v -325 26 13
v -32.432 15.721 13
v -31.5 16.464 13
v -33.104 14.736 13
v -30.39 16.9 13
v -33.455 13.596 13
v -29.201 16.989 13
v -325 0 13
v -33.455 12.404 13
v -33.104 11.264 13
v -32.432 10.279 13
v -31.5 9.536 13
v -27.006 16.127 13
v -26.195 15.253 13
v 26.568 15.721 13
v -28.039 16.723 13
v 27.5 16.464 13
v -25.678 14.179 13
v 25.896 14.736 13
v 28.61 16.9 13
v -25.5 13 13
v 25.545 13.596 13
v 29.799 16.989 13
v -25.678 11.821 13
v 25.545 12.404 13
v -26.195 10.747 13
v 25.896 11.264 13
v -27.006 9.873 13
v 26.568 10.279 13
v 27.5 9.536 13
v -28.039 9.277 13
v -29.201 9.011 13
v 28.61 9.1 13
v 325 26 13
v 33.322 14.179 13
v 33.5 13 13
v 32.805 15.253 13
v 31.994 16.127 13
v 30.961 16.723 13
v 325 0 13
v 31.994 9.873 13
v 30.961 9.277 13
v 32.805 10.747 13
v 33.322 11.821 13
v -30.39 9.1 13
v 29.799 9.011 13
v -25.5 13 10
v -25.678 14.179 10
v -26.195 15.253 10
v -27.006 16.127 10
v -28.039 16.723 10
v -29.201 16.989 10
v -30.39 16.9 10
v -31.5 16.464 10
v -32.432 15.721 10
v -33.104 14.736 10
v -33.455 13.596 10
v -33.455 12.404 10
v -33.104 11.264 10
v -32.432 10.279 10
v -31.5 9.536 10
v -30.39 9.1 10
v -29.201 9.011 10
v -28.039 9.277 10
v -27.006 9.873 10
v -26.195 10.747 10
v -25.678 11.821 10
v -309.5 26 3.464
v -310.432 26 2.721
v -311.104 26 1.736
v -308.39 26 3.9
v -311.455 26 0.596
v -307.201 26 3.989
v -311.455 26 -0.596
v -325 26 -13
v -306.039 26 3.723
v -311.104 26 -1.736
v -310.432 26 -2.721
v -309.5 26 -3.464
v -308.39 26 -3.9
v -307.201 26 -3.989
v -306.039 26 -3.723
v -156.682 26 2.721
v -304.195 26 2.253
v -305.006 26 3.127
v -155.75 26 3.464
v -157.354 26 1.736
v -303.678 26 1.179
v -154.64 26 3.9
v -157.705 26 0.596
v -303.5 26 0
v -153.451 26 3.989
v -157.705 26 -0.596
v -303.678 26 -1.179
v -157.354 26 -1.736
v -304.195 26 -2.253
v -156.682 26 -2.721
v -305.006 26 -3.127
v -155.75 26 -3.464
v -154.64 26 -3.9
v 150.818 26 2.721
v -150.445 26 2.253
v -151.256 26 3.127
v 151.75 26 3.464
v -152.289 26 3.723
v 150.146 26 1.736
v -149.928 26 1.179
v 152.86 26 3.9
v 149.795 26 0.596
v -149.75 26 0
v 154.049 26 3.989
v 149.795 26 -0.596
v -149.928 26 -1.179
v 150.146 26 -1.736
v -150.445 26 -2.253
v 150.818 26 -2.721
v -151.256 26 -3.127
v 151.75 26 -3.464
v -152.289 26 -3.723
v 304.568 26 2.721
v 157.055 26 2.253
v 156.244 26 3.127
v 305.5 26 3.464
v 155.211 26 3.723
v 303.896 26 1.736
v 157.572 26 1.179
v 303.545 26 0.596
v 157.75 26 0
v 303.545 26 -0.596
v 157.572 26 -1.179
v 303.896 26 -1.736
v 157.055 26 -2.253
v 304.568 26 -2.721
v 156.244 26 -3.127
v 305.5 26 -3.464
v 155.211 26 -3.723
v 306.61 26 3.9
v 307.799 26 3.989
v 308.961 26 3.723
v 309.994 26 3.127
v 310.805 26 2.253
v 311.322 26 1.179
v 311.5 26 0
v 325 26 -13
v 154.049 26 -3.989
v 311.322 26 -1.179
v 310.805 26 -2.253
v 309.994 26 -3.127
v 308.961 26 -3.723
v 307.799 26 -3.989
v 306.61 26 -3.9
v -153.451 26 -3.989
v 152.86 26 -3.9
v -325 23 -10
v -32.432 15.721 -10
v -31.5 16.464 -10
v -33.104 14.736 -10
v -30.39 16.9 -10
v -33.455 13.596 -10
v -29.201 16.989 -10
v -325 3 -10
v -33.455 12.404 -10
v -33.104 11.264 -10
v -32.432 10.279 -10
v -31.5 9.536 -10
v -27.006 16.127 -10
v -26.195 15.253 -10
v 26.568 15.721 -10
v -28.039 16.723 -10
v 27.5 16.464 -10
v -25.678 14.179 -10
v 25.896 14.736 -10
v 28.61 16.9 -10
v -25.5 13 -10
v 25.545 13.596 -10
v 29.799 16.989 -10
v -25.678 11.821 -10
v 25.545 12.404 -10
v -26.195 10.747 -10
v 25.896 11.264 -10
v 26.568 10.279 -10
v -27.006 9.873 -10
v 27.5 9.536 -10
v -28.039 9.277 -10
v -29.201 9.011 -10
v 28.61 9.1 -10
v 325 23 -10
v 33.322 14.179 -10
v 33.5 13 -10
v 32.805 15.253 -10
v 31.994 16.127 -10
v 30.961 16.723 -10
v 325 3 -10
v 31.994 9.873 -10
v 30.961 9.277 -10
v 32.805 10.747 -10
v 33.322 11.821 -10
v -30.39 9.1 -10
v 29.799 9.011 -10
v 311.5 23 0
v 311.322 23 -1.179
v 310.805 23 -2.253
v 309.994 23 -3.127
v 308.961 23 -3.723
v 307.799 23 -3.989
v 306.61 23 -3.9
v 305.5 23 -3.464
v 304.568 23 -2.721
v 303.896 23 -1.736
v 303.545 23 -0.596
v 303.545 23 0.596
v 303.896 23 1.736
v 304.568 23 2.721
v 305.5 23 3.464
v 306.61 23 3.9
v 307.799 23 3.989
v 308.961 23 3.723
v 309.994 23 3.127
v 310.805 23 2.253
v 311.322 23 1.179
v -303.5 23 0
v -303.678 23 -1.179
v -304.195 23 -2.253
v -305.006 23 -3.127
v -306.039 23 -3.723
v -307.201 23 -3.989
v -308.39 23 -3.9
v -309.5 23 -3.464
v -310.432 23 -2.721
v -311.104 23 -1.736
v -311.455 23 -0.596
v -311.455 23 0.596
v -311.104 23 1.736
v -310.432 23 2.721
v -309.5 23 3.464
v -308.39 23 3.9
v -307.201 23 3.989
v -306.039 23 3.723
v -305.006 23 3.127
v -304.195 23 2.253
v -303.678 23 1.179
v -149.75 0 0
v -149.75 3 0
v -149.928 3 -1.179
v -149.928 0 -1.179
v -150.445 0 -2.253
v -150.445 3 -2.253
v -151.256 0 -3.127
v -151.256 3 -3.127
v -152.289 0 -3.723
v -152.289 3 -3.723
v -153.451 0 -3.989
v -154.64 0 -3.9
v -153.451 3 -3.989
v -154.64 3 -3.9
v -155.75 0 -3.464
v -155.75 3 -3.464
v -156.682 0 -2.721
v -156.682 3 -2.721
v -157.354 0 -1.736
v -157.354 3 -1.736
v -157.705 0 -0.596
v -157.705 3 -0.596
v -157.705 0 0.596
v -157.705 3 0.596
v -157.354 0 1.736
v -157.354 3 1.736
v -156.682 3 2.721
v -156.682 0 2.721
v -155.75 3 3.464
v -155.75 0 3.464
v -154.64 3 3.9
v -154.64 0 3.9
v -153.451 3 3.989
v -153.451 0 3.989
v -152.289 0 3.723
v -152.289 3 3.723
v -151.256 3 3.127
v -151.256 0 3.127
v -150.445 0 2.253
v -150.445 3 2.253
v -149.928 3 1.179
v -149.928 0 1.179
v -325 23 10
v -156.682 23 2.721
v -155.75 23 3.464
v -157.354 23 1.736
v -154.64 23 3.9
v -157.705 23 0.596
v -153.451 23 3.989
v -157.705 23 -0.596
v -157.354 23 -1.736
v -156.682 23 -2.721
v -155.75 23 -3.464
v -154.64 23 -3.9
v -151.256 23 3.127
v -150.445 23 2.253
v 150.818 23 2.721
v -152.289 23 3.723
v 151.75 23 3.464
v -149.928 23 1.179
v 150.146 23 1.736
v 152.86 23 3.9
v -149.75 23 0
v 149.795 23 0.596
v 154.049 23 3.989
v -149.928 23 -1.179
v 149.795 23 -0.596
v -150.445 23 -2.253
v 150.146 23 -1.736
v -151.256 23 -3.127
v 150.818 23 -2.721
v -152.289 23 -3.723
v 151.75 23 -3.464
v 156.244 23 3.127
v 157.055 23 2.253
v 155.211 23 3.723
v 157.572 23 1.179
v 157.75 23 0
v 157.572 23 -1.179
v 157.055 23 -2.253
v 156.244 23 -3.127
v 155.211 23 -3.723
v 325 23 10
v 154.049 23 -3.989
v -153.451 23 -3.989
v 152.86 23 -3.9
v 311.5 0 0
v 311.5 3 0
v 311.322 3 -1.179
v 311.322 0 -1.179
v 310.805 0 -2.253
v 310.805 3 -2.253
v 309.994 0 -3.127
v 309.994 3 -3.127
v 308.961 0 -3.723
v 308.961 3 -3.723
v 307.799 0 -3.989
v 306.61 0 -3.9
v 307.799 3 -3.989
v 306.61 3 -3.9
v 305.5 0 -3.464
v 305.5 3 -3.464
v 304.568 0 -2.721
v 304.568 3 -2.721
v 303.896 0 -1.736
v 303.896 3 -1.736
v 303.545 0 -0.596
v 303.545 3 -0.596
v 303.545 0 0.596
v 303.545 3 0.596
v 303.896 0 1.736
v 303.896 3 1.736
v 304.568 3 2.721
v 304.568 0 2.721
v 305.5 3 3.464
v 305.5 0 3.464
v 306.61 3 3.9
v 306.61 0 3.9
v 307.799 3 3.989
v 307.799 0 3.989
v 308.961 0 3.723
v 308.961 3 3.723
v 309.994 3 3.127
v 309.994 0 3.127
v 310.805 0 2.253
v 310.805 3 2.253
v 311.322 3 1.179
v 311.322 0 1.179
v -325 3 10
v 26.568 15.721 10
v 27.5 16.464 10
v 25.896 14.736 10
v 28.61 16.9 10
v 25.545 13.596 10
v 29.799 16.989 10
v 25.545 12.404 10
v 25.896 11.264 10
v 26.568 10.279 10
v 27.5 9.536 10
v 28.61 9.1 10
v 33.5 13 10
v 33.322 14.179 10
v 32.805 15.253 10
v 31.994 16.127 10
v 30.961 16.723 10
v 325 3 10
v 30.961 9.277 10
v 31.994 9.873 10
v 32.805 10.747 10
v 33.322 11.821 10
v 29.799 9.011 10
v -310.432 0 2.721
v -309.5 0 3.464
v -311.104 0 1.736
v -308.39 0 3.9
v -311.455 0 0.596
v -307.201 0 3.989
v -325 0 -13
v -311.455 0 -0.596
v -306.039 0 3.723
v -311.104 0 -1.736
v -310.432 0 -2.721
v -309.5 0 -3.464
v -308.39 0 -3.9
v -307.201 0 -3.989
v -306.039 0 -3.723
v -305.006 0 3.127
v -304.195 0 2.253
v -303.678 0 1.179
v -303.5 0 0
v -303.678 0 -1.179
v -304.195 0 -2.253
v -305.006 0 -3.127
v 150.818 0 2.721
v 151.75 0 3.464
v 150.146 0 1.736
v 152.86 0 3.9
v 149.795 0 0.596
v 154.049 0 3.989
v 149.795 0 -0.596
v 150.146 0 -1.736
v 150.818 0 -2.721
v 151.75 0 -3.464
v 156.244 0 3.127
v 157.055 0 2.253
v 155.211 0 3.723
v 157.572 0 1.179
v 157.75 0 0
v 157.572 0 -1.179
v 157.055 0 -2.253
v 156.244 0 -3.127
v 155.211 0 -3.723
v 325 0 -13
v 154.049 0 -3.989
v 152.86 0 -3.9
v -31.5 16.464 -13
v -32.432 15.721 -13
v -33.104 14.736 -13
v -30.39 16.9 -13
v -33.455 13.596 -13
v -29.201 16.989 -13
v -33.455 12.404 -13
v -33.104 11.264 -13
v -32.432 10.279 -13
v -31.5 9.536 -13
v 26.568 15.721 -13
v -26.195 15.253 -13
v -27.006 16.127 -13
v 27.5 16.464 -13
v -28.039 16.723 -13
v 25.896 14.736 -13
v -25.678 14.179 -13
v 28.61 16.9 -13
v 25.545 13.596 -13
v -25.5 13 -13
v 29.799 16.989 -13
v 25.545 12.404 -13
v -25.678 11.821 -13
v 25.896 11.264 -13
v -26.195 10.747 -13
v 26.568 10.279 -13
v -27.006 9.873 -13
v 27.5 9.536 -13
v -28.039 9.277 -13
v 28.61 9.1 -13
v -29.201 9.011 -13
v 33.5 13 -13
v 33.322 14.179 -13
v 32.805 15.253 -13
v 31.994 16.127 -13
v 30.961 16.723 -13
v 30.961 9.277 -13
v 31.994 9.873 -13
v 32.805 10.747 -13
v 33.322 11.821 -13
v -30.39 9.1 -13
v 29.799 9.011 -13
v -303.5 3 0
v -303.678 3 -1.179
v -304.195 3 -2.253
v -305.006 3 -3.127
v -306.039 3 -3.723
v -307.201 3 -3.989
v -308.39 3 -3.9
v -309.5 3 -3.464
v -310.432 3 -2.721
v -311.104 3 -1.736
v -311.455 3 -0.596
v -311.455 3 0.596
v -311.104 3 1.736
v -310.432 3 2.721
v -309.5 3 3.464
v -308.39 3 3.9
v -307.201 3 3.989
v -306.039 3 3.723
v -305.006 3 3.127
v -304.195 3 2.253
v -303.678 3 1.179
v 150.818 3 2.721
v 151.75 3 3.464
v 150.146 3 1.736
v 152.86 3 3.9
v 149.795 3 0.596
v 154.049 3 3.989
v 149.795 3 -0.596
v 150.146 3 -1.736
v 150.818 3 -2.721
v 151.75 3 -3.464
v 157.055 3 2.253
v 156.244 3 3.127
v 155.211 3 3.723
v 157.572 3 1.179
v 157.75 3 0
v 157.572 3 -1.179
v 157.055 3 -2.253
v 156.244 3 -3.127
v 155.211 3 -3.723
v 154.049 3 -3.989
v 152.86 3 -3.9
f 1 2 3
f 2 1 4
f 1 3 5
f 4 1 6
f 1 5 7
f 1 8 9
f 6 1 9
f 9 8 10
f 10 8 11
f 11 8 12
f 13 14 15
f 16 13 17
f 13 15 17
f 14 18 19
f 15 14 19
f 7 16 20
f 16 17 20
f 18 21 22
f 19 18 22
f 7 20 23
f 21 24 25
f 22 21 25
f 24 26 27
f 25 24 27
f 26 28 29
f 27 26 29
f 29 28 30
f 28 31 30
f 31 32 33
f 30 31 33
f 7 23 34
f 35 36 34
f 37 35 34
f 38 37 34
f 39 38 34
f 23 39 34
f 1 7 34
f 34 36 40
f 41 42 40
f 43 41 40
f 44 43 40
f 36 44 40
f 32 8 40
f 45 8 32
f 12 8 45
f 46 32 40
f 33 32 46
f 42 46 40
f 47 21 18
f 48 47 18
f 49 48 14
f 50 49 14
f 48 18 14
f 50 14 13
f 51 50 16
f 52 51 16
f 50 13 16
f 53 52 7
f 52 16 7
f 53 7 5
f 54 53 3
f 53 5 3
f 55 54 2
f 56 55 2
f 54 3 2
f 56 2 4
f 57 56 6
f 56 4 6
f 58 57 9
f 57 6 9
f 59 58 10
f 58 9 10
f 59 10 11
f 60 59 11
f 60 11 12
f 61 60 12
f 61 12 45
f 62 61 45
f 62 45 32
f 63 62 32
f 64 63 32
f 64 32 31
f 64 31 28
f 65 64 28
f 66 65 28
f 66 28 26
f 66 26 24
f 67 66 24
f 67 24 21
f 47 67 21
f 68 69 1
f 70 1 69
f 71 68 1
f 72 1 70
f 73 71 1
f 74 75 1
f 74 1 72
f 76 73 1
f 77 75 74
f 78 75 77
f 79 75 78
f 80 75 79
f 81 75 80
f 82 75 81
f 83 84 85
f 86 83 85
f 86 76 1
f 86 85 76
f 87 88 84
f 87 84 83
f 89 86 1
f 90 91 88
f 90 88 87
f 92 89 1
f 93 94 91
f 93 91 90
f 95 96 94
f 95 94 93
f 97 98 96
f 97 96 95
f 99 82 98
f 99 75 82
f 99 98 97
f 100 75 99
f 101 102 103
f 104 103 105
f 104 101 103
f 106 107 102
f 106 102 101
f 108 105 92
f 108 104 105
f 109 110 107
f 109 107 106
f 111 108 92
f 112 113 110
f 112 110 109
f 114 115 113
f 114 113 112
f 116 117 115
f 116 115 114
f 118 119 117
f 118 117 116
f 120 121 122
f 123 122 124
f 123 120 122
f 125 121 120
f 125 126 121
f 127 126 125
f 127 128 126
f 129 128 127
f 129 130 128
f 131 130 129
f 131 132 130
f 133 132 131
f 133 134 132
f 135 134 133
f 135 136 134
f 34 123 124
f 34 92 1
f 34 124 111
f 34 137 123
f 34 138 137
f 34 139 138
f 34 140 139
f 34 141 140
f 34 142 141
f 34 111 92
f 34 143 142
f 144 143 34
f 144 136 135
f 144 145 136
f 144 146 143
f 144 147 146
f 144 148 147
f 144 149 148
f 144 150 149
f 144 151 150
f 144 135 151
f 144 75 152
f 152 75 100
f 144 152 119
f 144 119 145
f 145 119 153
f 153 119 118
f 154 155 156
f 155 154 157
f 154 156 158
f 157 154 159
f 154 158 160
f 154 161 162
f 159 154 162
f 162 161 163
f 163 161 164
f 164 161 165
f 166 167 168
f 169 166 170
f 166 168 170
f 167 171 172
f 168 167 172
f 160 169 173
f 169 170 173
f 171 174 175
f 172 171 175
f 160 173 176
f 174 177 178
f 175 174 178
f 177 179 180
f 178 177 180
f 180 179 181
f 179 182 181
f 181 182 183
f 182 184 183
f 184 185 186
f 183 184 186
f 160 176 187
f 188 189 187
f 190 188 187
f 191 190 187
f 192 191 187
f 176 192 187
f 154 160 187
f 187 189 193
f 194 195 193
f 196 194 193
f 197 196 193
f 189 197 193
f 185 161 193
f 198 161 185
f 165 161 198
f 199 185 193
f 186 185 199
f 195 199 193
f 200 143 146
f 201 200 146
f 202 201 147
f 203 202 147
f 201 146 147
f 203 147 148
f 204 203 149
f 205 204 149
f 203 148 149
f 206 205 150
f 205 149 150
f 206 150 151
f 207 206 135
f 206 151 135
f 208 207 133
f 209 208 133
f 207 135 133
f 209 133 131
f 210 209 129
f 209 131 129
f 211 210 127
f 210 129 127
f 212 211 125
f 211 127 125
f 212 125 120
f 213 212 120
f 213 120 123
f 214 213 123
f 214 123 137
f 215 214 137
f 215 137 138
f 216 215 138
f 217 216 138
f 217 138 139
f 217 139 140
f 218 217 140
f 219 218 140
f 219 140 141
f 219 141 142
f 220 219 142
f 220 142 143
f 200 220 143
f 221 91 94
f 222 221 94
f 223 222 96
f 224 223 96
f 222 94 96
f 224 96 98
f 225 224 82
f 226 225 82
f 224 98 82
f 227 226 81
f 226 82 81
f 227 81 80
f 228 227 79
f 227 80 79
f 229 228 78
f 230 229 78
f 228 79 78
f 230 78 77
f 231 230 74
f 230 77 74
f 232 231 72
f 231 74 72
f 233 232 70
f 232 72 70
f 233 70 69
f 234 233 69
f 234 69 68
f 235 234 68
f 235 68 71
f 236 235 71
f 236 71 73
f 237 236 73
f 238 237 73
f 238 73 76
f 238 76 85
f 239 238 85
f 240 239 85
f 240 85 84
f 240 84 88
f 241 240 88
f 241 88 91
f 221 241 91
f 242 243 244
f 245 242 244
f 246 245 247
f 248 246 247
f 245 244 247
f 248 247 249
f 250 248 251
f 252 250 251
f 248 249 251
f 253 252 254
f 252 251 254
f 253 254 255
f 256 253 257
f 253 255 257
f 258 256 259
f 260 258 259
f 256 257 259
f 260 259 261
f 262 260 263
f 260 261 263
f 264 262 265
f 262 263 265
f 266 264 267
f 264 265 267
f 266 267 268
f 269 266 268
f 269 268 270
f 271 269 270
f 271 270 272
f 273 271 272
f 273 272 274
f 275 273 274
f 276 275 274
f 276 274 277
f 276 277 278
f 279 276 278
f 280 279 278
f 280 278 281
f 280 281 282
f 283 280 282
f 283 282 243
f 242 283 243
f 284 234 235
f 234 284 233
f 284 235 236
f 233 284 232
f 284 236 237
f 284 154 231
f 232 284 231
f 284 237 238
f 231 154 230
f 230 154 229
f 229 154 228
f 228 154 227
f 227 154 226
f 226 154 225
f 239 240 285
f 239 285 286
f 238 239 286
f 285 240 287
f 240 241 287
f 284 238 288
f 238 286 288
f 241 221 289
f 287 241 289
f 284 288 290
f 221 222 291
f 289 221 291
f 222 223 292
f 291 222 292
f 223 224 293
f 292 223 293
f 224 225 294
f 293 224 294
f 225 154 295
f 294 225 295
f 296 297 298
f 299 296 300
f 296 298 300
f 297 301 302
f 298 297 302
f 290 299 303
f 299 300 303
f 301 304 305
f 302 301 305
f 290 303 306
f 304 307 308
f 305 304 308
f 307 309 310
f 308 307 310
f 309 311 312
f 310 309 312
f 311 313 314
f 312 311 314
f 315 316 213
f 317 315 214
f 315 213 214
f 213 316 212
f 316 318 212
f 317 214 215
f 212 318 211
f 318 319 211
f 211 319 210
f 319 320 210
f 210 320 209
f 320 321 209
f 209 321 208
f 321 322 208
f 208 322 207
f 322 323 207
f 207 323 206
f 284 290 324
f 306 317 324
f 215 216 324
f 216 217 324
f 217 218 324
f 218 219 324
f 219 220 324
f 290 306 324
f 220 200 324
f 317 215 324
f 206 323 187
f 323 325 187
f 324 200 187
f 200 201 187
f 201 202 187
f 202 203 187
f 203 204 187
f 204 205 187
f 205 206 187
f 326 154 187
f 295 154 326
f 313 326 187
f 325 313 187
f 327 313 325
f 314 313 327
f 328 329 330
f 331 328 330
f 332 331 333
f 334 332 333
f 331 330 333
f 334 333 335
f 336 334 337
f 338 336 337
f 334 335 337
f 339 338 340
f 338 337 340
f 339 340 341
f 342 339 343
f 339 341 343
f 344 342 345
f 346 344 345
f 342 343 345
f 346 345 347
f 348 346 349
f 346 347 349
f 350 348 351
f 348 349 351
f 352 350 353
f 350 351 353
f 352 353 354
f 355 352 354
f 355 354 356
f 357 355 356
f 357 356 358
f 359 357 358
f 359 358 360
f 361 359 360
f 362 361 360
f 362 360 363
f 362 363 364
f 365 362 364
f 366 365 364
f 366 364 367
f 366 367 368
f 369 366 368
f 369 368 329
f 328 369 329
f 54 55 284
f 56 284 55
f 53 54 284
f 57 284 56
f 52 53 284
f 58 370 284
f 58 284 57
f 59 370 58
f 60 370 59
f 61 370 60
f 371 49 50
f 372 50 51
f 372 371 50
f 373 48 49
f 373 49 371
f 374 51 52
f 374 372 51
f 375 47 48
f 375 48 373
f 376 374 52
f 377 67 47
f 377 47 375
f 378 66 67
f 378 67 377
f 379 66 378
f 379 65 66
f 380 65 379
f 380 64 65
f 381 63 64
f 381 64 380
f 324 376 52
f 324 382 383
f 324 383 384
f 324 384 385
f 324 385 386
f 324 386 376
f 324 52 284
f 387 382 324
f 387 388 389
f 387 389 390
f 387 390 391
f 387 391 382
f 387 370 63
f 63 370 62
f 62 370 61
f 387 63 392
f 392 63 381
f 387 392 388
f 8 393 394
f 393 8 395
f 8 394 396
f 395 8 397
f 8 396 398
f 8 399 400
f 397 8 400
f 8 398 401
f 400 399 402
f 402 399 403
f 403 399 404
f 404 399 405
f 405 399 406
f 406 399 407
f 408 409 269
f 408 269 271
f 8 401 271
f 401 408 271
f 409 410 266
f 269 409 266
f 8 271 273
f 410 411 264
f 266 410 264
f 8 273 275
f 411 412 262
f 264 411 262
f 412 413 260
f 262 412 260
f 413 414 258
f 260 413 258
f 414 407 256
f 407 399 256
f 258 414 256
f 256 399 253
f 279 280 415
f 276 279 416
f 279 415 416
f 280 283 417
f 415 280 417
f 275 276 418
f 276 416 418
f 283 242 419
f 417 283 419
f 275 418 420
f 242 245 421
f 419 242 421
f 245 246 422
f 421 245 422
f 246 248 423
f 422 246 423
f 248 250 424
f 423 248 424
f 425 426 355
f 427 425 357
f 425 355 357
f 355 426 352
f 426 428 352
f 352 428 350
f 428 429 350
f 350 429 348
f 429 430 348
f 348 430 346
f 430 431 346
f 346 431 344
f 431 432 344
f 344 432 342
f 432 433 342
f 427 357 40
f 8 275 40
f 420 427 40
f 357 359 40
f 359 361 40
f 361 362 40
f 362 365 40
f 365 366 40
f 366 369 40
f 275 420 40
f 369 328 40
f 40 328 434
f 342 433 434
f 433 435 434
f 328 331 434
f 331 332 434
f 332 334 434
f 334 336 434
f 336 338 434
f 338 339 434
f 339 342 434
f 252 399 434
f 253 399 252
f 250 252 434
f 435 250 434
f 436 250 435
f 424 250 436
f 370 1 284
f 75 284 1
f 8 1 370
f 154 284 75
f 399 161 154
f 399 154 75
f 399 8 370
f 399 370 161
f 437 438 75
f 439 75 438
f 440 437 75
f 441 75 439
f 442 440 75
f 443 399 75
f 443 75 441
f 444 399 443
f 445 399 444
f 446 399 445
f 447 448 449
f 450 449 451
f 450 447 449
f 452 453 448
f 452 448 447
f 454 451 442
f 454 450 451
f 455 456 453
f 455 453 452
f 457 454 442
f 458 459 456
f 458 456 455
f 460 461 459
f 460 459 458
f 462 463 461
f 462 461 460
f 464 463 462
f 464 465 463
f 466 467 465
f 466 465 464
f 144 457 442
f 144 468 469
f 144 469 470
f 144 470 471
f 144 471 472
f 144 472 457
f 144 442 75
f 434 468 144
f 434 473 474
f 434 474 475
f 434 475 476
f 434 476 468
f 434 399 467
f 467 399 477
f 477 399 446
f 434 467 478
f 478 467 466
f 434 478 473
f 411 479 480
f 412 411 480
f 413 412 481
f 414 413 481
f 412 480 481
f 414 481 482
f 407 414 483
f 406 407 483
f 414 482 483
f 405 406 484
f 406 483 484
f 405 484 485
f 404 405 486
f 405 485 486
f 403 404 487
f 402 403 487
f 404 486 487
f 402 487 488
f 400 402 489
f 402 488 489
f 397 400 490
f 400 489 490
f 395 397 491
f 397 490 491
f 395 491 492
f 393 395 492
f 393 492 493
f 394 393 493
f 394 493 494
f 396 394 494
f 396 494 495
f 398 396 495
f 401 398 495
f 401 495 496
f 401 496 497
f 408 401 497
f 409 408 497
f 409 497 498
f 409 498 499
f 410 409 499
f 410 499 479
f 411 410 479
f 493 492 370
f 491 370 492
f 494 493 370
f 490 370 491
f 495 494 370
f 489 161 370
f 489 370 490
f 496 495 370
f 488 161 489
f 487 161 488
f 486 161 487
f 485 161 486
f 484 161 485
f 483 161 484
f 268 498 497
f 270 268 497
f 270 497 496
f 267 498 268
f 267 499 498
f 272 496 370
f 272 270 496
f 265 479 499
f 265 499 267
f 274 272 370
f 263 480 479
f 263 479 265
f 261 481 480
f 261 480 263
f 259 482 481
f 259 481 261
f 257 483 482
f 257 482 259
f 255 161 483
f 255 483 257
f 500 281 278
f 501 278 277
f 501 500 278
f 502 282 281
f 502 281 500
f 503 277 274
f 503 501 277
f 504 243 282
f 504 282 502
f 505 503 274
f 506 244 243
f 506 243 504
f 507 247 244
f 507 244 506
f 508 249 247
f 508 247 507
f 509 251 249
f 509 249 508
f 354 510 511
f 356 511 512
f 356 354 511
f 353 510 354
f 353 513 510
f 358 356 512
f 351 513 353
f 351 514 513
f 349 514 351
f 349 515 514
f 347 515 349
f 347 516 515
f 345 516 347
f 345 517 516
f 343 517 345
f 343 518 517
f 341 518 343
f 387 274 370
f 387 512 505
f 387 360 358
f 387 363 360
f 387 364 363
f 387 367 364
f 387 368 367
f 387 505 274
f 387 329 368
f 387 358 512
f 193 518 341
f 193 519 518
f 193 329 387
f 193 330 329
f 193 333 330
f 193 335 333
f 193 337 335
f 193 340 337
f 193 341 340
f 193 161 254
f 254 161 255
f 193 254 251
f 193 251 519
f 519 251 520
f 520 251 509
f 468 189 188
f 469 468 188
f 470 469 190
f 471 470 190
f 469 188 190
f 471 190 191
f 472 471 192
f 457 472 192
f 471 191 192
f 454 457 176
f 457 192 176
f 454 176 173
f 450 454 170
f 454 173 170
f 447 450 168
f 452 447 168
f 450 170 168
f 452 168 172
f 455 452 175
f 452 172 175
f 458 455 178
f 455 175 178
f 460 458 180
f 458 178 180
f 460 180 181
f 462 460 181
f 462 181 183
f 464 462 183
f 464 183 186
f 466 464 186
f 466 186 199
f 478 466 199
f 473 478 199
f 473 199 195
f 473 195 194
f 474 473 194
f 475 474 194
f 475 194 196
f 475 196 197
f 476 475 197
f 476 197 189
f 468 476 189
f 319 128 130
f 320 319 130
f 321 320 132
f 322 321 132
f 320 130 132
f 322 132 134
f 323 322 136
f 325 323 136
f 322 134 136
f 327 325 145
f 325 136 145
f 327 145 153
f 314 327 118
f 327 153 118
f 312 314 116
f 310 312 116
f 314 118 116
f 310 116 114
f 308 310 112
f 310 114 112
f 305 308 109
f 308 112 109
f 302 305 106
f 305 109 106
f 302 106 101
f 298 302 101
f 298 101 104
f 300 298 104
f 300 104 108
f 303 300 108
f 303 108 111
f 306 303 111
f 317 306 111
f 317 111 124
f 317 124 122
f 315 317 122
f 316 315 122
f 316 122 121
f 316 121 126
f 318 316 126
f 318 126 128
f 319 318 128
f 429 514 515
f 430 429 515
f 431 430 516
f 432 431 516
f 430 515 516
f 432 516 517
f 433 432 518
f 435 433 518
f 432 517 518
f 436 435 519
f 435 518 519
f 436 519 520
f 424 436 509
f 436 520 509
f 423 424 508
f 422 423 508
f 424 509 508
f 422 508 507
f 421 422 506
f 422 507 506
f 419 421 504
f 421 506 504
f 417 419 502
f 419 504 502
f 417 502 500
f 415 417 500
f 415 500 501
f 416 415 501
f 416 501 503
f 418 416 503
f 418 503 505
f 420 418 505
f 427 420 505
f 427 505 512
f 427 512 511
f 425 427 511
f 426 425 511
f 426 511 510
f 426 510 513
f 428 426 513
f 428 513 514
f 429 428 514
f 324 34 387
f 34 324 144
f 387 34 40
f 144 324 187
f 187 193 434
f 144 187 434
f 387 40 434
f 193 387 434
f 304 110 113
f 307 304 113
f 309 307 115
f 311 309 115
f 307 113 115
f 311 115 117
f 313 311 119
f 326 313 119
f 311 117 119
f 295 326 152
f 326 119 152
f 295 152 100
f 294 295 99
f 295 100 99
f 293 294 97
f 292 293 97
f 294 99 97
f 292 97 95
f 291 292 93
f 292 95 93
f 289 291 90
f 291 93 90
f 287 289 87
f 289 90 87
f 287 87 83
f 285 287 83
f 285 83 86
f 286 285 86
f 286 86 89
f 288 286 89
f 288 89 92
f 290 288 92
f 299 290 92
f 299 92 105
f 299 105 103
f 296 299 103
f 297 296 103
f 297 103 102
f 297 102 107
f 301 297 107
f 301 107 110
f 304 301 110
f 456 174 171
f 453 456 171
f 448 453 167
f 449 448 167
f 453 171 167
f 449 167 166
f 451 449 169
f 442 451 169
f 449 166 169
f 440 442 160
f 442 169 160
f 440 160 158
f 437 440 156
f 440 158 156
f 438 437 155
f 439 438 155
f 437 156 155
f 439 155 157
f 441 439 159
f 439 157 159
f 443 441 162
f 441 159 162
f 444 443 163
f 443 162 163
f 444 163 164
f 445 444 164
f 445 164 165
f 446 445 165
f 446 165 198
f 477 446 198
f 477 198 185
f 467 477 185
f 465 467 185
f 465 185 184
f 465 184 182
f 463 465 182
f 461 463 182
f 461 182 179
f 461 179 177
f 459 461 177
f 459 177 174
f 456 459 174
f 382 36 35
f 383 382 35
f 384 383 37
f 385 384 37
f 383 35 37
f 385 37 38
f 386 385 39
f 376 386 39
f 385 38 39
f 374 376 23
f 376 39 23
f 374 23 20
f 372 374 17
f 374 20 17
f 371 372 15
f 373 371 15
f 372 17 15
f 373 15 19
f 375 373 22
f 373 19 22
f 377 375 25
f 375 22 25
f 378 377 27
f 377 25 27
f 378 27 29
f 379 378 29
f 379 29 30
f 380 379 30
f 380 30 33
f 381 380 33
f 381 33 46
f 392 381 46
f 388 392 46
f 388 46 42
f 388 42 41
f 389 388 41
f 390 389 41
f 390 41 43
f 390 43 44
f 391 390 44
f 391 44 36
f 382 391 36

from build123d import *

# Parameters (mm, degrees)
SKETCH1_W           = 650
SKETCH1_H           = 26
BOSS_EXTRUDE1_DEPTH = 26
SHELL1_T            = -3
SKETCH2_R           = 4
CUT_EXTRUDE1_DEPTH  = 26
SKETCH3_R           = 4
CUT_EXTRUDE2_DEPTH  = 27


with BuildPart() as part:
    # Sketch1 → Boss-Extrude1 (new body)
    with BuildSketch(Plane(origin=(0, 0, 0), x_dir=(1, 0, 0), z_dir=(0, 1, 0))):
        Rectangle(SKETCH1_W, SKETCH1_H)
    extrude(amount=BOSS_EXTRUDE1_DEPTH)

    # Shell1
    shell1_openings = [part.faces().sort_by_distance(p)[0] for p in [
        (-325, 13, 0),
        (325, 13, 0),
    ]]
    offset(amount=SHELL1_T, openings=shell1_openings, kind=Kind.INTERSECTION)

    # Sketch2 → Cut-Extrude1 (cut)
    with BuildSketch(Plane(origin=(0, 26, 0), x_dir=(1, 0, 0), z_dir=(0, 1, 0))):
        with Locations((307.5, 0)):
            Circle(SKETCH2_R)
        with Locations((-307.5, 0)):
            Circle(SKETCH2_R)
        with Locations((153.75, 0)):
            Circle(SKETCH2_R)
        with Locations((-153.75, 0)):
            Circle(SKETCH2_R)
    extrude(amount=-CUT_EXTRUDE1_DEPTH, mode=Mode.SUBTRACT)

    # Sketch3 → Cut-Extrude2 (cut, through all)
    with BuildSketch(Plane.XY.offset(13)):
        with Locations((-29.5, 13)):
            Circle(SKETCH3_R)
        with Locations((29.5, 13)):
            Circle(SKETCH3_R)
    extrude(amount=-CUT_EXTRUDE2_DEPTH, mode=Mode.SUBTRACT)


solid = part.part
